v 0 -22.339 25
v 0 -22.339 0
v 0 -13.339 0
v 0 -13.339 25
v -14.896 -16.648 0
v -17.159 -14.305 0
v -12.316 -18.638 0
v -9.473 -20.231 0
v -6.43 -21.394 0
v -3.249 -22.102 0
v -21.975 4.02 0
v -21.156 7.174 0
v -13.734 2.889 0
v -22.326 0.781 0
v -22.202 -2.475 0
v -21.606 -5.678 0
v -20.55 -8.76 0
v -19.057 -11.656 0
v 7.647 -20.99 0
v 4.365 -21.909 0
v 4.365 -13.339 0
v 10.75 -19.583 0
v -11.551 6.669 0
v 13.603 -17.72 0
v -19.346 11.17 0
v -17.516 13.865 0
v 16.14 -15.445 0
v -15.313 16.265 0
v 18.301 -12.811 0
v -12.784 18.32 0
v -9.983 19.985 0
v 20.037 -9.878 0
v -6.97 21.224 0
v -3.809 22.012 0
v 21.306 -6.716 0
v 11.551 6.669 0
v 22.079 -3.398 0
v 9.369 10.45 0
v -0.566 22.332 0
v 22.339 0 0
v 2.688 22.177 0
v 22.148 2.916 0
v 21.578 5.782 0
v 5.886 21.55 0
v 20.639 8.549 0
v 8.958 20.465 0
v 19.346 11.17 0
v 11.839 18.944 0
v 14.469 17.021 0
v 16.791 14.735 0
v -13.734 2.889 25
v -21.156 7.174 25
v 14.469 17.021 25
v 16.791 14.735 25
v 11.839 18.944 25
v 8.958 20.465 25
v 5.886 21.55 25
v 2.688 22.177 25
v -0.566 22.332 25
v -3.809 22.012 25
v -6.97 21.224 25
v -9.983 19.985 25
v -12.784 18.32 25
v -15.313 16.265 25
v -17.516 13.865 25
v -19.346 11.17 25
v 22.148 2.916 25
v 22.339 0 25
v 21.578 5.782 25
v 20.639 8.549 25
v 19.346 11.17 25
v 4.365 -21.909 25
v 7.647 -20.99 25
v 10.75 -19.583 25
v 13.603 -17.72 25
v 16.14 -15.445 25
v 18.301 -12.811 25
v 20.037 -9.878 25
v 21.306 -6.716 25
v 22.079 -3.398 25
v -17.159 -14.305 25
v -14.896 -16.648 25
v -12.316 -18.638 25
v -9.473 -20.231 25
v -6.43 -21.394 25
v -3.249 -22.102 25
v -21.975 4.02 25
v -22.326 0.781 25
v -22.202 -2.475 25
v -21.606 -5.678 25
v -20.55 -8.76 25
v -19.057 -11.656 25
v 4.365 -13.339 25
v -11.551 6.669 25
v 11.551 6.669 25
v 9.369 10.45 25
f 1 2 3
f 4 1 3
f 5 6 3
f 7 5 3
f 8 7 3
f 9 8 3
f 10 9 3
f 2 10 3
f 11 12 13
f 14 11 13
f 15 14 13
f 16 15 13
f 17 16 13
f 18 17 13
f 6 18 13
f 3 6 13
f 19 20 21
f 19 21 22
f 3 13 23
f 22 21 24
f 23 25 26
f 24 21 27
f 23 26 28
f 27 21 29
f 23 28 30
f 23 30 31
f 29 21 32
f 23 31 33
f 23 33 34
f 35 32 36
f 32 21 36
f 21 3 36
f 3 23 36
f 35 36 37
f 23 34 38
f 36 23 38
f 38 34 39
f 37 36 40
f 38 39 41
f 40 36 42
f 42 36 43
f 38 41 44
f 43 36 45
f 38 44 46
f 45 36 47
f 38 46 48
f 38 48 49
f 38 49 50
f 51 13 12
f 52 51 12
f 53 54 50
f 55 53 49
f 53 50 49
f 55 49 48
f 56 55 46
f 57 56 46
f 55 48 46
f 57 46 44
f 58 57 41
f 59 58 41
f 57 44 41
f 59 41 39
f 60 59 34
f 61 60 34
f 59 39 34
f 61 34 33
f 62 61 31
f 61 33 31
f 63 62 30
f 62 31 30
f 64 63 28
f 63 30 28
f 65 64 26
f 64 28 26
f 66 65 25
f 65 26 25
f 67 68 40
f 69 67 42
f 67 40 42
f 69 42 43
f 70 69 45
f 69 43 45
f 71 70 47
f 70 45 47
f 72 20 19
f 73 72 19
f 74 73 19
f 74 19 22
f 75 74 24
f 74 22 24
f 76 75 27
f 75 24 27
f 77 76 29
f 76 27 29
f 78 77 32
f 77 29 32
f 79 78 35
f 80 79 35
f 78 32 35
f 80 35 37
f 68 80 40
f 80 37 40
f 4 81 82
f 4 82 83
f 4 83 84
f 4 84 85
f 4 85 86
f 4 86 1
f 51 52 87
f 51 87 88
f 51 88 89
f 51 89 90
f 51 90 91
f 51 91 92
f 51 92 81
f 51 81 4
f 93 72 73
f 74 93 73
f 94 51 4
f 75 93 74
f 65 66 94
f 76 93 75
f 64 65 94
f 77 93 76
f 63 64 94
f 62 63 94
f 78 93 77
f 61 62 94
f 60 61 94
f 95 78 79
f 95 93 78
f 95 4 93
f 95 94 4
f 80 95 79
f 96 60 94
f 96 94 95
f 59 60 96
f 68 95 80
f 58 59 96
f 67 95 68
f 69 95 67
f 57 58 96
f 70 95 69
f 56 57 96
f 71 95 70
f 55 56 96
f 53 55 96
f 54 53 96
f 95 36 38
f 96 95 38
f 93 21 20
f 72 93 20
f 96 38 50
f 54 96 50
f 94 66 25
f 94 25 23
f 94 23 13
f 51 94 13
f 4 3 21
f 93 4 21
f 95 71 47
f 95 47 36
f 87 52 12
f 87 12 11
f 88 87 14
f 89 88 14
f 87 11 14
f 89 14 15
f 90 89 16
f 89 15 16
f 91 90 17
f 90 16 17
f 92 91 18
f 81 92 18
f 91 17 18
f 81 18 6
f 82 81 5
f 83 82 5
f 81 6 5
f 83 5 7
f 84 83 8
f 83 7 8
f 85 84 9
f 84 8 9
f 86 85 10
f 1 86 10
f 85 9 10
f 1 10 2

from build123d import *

# Parameters (mm, degrees)
F1_DEPTH = 25


with BuildPart() as f1:
    # F0 (on Top) → F1 (new body)
    with BuildSketch(Plane.XY):
        with BuildLine():
            ThreePointArc((4.365322, -21.90869), (17.27086, -14.169126), (22.339354, 0))
            ThreePointArc((22.339354, 0), (21.578159, 5.78185), (19.346448, 11.169677))
            Line((19.346448, 11.169677), (11.551495, 6.669259))
            Line((11.551495, 6.669259), (9.368834, 10.449739))
            Line((9.368834, 10.449739), (16.790821, 14.734825))
            ThreePointArc((16.790821, 14.734825), (-2.193257, 22.231427), (-19.346448, 11.169677))
            Line((-19.346448, 11.169677), (-11.551495, 6.669259))
            Line((-11.551495, 6.669259), (-13.734156, 2.888779))
            Line((-13.734156, 2.888779), (-21.156143, 7.173865))
            ThreePointArc((-21.156143, 7.173865), (-18.156352, -13.01513), (0, -22.339354))
            Line((0, -22.339354), (0, -13.338517))
            Line((0, -13.338517), (4.365322, -13.338517))
            Line((4.365322, -13.338517), (4.365322, -21.90869))
        make_face()
    extrude(amount=F1_DEPTH)


solid = f1.part
